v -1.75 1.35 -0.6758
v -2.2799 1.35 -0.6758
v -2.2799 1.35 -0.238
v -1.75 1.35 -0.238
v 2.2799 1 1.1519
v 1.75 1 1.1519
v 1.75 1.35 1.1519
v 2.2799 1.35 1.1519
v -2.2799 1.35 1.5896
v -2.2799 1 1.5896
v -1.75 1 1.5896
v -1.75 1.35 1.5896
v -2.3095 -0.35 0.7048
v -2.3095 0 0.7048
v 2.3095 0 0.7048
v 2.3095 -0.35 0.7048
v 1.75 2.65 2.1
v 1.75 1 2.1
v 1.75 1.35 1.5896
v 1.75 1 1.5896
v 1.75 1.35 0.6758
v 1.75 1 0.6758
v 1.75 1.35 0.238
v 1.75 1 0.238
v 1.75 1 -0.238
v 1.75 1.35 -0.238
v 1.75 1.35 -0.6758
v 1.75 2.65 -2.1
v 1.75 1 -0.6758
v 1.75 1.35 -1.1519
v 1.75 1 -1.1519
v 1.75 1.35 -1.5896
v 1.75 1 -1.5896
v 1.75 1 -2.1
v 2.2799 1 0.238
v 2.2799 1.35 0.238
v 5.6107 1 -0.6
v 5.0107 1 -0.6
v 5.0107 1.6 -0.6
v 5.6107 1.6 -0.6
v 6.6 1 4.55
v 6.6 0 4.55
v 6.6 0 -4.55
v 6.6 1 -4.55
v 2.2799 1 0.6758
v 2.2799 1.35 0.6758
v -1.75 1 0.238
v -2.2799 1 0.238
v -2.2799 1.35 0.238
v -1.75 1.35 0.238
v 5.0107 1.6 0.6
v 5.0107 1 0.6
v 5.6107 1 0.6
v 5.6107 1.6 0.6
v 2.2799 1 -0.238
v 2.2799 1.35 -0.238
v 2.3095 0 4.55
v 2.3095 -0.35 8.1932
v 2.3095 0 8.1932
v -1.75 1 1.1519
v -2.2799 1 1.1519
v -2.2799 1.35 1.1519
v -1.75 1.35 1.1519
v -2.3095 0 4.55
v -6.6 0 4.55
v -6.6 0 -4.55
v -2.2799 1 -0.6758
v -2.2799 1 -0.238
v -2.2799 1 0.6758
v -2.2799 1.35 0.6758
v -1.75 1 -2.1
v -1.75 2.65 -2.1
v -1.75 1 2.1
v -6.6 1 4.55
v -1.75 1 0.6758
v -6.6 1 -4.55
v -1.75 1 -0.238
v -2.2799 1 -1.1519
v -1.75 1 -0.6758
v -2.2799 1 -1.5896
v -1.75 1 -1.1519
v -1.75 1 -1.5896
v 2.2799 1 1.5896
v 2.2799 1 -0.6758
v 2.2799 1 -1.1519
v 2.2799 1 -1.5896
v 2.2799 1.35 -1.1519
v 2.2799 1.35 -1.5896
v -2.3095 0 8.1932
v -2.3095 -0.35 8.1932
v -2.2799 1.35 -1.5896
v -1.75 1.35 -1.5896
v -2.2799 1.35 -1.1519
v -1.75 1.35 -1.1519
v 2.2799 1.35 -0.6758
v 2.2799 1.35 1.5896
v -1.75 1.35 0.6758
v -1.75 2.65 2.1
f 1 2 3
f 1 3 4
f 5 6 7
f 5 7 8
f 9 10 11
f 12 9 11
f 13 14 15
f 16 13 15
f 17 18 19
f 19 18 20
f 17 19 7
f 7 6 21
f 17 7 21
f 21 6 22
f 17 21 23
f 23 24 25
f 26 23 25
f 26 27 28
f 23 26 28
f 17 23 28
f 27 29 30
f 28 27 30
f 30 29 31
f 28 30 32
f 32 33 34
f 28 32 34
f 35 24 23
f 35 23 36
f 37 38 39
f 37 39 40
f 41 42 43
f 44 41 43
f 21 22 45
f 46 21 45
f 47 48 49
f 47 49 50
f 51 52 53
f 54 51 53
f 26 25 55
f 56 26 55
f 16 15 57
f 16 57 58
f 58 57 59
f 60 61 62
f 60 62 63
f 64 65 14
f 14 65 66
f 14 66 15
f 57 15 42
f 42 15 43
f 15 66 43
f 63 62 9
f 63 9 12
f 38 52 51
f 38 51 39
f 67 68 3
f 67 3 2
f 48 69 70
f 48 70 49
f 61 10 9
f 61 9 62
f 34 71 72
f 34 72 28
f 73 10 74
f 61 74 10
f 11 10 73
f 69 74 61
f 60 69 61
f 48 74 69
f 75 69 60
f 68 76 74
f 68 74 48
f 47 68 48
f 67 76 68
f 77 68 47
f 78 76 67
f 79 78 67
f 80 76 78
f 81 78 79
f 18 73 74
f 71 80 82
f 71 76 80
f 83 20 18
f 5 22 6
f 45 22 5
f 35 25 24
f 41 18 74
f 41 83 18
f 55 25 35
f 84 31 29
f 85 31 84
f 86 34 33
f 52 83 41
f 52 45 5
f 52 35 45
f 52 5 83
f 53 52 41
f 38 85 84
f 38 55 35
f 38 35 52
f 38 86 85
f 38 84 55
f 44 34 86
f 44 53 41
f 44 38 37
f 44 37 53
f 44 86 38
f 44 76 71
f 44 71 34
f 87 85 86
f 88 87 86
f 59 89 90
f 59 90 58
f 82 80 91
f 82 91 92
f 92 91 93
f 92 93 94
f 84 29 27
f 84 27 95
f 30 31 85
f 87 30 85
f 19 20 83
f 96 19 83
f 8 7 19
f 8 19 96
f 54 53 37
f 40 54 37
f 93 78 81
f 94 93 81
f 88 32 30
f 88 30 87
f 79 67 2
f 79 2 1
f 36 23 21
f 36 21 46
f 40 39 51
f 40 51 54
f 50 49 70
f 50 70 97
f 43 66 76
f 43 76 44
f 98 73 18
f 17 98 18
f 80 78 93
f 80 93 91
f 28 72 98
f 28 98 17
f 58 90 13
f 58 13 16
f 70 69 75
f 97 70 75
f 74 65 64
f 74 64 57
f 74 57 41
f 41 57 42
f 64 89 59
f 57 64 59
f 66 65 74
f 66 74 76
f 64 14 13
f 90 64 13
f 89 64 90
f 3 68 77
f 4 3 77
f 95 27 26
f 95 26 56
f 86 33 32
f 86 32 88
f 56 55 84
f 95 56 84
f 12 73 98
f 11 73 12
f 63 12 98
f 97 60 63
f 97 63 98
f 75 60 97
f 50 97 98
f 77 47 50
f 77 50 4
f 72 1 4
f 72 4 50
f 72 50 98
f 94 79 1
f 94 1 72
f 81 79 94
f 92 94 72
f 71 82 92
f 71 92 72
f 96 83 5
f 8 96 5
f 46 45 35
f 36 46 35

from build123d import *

# Parameters (mm, degrees)
SKETCH1_W           = 13.2
SKETCH1_H           = 9.1
BOSS_EXTRUDE1_DEPTH = 1
SKETCH2_W           = 3.5
SKETCH2_H           = 4.2
BOSS_EXTRUDE2_DEPTH = 1.65
SKETCH3_W           = 0.6
SKETCH3_H           = 1.2
BOSS_EXTRUDE3_DEPTH = 0.6
SKETCH4_W           = 4.618980196
SKETCH4_H           = 7.488452384
BOSS_EXTRUDE4_DEPTH = 0.35
SKETCH5_W           = 0.529853481
SKETCH5_H           = 0.437759734
SKETCH5_H_2         = 0.437759735
BOSS_EXTRUDE5_DEPTH = 1.35


with BuildPart() as part:
    # Sketch1 → Boss-Extrude1 (new body)
    with BuildSketch(Plane(origin=(0, 0, 0), x_dir=(1, 0, 0), z_dir=(0, 1, 0))):
        Rectangle(SKETCH1_W, SKETCH1_H)
    extrude(amount=BOSS_EXTRUDE1_DEPTH)

    # Sketch2 → Boss-Extrude2 (add)
    with BuildSketch(Plane(origin=(0, 1, 0), x_dir=(1, 0, 0), z_dir=(0, 1, 0))):
        Rectangle(SKETCH2_W, SKETCH2_H)
    extrude(amount=BOSS_EXTRUDE2_DEPTH)

    # Sketch3 → Boss-Extrude3 (add)
    with BuildSketch(Plane(origin=(0, 1, 0), x_dir=(1, 0, 0), z_dir=(0, 1, 0))):
        with Locations((5.310699057, 0)):
            Rectangle(SKETCH3_W, SKETCH3_H)
    extrude(amount=BOSS_EXTRUDE3_DEPTH)

    # Sketch4 → Boss-Extrude4 (add)
    with BuildSketch(Plane.XZ):
        with Locations((0, 4.449008393)):
            Rectangle(SKETCH4_W, SKETCH4_H)
    extrude(amount=BOSS_EXTRUDE4_DEPTH)

    # Sketch5 → Boss-Extrude5 (add)
    with BuildSketch(Plane(origin=(0, 0, 0), x_dir=(1, 0, 0), z_dir=(0, 1, 0))):
        with Locations((-2.01492674, 1.370758696)):
            Rectangle(SKETCH5_W, SKETCH5_H)
        with Locations((-2.01492674, 0.456919566)):
            Rectangle(SKETCH5_W, SKETCH5_H_2)
        with Locations((2.01492674, 0.456919566)):
            Rectangle(SKETCH5_W, SKETCH5_H_2)
        with Locations((2.01492674, 1.370758696)):
            Rectangle(SKETCH5_W, SKETCH5_H)
        with Locations((2.01492674, -1.370758696)):
            Rectangle(SKETCH5_W, SKETCH5_H)
        with Locations((2.01492674, -0.456919566)):
            Rectangle(SKETCH5_W, SKETCH5_H_2)
        with Locations((-2.01492674, -0.456919566)):
            Rectangle(SKETCH5_W, SKETCH5_H_2)
        with Locations((-2.01492674, -1.370758696)):
            Rectangle(SKETCH5_W, SKETCH5_H)
    extrude(amount=BOSS_EXTRUDE5_DEPTH)


solid = part.part
